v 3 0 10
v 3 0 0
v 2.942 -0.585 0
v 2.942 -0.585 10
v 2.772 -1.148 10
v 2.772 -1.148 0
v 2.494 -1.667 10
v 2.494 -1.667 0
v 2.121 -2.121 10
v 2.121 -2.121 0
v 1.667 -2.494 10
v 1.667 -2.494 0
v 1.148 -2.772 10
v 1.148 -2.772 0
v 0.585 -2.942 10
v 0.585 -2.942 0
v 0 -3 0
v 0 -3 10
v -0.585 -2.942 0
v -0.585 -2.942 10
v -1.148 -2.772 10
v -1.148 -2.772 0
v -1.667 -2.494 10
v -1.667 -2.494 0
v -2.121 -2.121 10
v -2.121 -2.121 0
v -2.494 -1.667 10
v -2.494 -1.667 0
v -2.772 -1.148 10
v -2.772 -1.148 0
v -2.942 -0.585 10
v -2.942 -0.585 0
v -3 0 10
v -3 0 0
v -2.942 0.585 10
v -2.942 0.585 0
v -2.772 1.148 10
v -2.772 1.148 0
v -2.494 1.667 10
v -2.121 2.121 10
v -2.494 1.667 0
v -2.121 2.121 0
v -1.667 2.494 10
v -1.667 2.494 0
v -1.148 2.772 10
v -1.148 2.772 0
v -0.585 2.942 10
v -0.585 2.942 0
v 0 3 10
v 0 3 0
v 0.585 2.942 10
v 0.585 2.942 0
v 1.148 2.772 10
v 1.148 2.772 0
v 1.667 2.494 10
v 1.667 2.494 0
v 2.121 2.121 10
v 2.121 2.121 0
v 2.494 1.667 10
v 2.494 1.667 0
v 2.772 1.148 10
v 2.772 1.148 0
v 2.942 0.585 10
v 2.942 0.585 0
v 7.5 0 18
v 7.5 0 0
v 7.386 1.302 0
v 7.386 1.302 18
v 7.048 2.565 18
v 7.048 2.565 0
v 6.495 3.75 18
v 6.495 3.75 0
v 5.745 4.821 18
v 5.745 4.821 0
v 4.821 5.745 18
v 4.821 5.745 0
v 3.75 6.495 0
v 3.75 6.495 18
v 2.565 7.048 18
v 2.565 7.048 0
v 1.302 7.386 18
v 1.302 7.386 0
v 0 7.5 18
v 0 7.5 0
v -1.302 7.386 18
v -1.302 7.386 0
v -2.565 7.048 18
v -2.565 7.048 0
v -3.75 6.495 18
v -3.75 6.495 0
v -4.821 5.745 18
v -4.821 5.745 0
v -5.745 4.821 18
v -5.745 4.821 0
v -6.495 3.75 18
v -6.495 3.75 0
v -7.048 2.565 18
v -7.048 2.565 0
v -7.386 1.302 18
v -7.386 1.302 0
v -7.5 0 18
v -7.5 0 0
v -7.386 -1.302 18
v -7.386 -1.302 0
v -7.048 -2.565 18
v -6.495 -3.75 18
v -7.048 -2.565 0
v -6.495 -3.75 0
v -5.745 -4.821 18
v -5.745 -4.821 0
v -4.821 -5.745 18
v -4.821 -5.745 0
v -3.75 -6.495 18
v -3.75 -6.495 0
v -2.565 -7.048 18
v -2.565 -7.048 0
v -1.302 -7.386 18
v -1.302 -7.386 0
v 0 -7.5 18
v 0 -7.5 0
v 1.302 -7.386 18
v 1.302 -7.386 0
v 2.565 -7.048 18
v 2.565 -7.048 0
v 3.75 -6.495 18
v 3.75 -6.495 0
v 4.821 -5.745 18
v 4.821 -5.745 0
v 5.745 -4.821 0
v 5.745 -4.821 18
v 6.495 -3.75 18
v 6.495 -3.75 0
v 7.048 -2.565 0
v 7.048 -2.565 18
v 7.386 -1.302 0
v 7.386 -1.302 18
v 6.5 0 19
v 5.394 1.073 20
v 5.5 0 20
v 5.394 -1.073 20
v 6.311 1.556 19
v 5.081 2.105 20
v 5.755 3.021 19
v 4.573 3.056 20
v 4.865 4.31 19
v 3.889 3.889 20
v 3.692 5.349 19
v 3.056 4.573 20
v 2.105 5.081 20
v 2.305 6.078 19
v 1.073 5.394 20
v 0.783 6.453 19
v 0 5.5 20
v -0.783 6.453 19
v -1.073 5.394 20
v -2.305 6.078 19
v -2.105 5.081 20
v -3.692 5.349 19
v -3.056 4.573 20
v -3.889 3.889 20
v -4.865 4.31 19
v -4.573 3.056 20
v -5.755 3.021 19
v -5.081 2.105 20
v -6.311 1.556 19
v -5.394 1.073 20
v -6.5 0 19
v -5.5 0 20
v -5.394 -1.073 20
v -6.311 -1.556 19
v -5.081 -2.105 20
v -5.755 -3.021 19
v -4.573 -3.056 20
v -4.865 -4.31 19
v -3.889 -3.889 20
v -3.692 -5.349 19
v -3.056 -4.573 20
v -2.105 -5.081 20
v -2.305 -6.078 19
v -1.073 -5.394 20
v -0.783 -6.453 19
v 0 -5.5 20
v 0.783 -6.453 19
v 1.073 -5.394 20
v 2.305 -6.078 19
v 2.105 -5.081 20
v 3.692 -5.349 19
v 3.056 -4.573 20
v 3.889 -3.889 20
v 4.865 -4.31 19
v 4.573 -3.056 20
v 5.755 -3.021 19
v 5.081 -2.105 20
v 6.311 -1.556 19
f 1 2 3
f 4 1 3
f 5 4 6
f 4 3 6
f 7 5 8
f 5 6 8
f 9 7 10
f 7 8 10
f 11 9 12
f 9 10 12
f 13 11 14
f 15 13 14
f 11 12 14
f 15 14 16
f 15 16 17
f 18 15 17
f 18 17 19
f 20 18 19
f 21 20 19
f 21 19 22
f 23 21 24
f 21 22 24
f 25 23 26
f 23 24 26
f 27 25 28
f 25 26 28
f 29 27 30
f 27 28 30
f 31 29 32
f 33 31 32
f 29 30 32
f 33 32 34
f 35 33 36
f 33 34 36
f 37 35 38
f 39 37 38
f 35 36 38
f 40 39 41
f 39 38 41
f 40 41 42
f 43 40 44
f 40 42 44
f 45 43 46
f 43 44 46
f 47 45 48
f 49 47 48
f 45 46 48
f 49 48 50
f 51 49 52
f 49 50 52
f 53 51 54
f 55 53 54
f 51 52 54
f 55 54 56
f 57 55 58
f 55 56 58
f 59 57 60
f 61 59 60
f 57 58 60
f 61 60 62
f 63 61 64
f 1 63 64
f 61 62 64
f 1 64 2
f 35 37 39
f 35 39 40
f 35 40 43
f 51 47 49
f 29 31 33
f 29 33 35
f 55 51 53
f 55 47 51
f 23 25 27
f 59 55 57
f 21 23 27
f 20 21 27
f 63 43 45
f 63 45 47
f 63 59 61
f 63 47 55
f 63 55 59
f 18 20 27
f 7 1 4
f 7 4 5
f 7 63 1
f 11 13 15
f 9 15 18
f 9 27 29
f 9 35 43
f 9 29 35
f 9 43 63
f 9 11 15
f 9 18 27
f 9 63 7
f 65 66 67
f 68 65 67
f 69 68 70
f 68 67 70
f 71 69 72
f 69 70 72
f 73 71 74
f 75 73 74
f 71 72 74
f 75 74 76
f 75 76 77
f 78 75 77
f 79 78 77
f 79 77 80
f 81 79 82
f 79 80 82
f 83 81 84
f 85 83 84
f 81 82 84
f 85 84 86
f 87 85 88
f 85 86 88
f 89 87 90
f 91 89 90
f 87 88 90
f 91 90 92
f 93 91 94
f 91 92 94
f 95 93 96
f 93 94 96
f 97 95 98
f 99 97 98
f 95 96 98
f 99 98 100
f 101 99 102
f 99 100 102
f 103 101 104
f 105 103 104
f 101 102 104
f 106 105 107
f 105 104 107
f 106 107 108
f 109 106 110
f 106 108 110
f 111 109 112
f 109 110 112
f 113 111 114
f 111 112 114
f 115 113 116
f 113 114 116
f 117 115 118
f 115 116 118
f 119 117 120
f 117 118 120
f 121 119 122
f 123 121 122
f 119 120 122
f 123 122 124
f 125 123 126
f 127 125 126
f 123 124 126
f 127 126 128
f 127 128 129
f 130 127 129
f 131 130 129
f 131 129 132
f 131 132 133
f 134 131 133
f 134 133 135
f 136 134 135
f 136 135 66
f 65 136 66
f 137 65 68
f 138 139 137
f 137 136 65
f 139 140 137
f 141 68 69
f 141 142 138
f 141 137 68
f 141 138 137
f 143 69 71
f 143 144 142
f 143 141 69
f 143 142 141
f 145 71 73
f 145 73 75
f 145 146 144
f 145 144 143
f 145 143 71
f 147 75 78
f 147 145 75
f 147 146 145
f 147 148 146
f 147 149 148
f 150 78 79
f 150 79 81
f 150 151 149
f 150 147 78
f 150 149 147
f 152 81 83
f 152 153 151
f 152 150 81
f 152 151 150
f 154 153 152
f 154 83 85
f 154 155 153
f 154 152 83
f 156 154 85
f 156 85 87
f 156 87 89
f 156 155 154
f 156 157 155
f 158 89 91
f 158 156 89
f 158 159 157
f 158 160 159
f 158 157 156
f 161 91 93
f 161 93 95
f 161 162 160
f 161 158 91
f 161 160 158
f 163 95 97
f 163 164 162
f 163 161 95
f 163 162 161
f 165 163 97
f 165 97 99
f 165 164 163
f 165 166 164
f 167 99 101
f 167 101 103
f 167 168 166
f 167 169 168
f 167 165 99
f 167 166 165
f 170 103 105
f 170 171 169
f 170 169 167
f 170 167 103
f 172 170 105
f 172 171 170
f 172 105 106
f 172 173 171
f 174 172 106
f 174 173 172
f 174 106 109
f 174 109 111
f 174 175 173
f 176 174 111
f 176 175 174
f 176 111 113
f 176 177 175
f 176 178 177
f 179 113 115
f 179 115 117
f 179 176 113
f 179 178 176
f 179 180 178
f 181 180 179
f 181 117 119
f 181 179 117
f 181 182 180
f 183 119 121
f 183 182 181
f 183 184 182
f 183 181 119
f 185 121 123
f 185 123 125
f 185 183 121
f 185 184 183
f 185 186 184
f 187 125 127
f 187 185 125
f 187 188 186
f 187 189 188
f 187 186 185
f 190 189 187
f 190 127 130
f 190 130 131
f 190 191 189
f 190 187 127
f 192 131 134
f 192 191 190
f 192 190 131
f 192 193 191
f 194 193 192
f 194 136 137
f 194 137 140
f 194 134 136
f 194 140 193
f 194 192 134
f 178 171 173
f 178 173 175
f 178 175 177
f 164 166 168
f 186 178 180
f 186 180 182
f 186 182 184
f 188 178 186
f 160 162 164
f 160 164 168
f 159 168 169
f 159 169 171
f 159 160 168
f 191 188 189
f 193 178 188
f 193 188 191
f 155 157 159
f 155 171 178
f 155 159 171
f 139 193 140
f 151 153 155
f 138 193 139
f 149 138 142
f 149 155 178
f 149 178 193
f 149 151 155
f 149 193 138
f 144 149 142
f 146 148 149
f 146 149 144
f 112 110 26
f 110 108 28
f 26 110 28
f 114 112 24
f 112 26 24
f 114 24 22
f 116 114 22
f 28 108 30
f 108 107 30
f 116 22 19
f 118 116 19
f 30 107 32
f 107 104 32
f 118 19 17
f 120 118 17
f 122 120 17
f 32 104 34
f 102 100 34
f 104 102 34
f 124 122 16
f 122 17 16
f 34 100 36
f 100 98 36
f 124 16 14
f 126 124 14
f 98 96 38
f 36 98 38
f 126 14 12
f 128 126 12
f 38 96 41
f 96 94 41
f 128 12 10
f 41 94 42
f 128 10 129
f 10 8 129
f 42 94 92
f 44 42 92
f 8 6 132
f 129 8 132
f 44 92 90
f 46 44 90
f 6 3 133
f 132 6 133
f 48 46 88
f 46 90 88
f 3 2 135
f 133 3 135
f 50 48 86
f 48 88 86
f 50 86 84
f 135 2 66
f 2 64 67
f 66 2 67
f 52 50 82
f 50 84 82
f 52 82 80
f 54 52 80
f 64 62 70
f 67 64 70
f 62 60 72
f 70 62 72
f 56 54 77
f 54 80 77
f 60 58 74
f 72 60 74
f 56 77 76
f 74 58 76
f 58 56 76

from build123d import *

# Parameters (mm, degrees)
F0_R     = 7.5
F1_DEPTH = 20
F2_SIZE  = 2
F3_R     = 3
F4_DEPTH = 10


with BuildPart() as f1:
    # F0 (on Top) → F1 (new body)
    with BuildSketch(Plane.XY):
        Circle(F0_R)
    extrude(amount=F1_DEPTH)

    # F2
    f2_edges = [f1.edges().sort_by_distance(p)[0] for p in [
        (-7.5, 0, 20),
    ]]
    chamfer(f2_edges, length=F2_SIZE)

    # F3 (on face) → F4 (cut)
    with BuildSketch(Plane(origin=(0, 0, 0), x_dir=(1, 0, 0), z_dir=(0, 0, -1))):
        Circle(F3_R)
    extrude(amount=-F4_DEPTH, mode=Mode.SUBTRACT)


solid = f1.part
